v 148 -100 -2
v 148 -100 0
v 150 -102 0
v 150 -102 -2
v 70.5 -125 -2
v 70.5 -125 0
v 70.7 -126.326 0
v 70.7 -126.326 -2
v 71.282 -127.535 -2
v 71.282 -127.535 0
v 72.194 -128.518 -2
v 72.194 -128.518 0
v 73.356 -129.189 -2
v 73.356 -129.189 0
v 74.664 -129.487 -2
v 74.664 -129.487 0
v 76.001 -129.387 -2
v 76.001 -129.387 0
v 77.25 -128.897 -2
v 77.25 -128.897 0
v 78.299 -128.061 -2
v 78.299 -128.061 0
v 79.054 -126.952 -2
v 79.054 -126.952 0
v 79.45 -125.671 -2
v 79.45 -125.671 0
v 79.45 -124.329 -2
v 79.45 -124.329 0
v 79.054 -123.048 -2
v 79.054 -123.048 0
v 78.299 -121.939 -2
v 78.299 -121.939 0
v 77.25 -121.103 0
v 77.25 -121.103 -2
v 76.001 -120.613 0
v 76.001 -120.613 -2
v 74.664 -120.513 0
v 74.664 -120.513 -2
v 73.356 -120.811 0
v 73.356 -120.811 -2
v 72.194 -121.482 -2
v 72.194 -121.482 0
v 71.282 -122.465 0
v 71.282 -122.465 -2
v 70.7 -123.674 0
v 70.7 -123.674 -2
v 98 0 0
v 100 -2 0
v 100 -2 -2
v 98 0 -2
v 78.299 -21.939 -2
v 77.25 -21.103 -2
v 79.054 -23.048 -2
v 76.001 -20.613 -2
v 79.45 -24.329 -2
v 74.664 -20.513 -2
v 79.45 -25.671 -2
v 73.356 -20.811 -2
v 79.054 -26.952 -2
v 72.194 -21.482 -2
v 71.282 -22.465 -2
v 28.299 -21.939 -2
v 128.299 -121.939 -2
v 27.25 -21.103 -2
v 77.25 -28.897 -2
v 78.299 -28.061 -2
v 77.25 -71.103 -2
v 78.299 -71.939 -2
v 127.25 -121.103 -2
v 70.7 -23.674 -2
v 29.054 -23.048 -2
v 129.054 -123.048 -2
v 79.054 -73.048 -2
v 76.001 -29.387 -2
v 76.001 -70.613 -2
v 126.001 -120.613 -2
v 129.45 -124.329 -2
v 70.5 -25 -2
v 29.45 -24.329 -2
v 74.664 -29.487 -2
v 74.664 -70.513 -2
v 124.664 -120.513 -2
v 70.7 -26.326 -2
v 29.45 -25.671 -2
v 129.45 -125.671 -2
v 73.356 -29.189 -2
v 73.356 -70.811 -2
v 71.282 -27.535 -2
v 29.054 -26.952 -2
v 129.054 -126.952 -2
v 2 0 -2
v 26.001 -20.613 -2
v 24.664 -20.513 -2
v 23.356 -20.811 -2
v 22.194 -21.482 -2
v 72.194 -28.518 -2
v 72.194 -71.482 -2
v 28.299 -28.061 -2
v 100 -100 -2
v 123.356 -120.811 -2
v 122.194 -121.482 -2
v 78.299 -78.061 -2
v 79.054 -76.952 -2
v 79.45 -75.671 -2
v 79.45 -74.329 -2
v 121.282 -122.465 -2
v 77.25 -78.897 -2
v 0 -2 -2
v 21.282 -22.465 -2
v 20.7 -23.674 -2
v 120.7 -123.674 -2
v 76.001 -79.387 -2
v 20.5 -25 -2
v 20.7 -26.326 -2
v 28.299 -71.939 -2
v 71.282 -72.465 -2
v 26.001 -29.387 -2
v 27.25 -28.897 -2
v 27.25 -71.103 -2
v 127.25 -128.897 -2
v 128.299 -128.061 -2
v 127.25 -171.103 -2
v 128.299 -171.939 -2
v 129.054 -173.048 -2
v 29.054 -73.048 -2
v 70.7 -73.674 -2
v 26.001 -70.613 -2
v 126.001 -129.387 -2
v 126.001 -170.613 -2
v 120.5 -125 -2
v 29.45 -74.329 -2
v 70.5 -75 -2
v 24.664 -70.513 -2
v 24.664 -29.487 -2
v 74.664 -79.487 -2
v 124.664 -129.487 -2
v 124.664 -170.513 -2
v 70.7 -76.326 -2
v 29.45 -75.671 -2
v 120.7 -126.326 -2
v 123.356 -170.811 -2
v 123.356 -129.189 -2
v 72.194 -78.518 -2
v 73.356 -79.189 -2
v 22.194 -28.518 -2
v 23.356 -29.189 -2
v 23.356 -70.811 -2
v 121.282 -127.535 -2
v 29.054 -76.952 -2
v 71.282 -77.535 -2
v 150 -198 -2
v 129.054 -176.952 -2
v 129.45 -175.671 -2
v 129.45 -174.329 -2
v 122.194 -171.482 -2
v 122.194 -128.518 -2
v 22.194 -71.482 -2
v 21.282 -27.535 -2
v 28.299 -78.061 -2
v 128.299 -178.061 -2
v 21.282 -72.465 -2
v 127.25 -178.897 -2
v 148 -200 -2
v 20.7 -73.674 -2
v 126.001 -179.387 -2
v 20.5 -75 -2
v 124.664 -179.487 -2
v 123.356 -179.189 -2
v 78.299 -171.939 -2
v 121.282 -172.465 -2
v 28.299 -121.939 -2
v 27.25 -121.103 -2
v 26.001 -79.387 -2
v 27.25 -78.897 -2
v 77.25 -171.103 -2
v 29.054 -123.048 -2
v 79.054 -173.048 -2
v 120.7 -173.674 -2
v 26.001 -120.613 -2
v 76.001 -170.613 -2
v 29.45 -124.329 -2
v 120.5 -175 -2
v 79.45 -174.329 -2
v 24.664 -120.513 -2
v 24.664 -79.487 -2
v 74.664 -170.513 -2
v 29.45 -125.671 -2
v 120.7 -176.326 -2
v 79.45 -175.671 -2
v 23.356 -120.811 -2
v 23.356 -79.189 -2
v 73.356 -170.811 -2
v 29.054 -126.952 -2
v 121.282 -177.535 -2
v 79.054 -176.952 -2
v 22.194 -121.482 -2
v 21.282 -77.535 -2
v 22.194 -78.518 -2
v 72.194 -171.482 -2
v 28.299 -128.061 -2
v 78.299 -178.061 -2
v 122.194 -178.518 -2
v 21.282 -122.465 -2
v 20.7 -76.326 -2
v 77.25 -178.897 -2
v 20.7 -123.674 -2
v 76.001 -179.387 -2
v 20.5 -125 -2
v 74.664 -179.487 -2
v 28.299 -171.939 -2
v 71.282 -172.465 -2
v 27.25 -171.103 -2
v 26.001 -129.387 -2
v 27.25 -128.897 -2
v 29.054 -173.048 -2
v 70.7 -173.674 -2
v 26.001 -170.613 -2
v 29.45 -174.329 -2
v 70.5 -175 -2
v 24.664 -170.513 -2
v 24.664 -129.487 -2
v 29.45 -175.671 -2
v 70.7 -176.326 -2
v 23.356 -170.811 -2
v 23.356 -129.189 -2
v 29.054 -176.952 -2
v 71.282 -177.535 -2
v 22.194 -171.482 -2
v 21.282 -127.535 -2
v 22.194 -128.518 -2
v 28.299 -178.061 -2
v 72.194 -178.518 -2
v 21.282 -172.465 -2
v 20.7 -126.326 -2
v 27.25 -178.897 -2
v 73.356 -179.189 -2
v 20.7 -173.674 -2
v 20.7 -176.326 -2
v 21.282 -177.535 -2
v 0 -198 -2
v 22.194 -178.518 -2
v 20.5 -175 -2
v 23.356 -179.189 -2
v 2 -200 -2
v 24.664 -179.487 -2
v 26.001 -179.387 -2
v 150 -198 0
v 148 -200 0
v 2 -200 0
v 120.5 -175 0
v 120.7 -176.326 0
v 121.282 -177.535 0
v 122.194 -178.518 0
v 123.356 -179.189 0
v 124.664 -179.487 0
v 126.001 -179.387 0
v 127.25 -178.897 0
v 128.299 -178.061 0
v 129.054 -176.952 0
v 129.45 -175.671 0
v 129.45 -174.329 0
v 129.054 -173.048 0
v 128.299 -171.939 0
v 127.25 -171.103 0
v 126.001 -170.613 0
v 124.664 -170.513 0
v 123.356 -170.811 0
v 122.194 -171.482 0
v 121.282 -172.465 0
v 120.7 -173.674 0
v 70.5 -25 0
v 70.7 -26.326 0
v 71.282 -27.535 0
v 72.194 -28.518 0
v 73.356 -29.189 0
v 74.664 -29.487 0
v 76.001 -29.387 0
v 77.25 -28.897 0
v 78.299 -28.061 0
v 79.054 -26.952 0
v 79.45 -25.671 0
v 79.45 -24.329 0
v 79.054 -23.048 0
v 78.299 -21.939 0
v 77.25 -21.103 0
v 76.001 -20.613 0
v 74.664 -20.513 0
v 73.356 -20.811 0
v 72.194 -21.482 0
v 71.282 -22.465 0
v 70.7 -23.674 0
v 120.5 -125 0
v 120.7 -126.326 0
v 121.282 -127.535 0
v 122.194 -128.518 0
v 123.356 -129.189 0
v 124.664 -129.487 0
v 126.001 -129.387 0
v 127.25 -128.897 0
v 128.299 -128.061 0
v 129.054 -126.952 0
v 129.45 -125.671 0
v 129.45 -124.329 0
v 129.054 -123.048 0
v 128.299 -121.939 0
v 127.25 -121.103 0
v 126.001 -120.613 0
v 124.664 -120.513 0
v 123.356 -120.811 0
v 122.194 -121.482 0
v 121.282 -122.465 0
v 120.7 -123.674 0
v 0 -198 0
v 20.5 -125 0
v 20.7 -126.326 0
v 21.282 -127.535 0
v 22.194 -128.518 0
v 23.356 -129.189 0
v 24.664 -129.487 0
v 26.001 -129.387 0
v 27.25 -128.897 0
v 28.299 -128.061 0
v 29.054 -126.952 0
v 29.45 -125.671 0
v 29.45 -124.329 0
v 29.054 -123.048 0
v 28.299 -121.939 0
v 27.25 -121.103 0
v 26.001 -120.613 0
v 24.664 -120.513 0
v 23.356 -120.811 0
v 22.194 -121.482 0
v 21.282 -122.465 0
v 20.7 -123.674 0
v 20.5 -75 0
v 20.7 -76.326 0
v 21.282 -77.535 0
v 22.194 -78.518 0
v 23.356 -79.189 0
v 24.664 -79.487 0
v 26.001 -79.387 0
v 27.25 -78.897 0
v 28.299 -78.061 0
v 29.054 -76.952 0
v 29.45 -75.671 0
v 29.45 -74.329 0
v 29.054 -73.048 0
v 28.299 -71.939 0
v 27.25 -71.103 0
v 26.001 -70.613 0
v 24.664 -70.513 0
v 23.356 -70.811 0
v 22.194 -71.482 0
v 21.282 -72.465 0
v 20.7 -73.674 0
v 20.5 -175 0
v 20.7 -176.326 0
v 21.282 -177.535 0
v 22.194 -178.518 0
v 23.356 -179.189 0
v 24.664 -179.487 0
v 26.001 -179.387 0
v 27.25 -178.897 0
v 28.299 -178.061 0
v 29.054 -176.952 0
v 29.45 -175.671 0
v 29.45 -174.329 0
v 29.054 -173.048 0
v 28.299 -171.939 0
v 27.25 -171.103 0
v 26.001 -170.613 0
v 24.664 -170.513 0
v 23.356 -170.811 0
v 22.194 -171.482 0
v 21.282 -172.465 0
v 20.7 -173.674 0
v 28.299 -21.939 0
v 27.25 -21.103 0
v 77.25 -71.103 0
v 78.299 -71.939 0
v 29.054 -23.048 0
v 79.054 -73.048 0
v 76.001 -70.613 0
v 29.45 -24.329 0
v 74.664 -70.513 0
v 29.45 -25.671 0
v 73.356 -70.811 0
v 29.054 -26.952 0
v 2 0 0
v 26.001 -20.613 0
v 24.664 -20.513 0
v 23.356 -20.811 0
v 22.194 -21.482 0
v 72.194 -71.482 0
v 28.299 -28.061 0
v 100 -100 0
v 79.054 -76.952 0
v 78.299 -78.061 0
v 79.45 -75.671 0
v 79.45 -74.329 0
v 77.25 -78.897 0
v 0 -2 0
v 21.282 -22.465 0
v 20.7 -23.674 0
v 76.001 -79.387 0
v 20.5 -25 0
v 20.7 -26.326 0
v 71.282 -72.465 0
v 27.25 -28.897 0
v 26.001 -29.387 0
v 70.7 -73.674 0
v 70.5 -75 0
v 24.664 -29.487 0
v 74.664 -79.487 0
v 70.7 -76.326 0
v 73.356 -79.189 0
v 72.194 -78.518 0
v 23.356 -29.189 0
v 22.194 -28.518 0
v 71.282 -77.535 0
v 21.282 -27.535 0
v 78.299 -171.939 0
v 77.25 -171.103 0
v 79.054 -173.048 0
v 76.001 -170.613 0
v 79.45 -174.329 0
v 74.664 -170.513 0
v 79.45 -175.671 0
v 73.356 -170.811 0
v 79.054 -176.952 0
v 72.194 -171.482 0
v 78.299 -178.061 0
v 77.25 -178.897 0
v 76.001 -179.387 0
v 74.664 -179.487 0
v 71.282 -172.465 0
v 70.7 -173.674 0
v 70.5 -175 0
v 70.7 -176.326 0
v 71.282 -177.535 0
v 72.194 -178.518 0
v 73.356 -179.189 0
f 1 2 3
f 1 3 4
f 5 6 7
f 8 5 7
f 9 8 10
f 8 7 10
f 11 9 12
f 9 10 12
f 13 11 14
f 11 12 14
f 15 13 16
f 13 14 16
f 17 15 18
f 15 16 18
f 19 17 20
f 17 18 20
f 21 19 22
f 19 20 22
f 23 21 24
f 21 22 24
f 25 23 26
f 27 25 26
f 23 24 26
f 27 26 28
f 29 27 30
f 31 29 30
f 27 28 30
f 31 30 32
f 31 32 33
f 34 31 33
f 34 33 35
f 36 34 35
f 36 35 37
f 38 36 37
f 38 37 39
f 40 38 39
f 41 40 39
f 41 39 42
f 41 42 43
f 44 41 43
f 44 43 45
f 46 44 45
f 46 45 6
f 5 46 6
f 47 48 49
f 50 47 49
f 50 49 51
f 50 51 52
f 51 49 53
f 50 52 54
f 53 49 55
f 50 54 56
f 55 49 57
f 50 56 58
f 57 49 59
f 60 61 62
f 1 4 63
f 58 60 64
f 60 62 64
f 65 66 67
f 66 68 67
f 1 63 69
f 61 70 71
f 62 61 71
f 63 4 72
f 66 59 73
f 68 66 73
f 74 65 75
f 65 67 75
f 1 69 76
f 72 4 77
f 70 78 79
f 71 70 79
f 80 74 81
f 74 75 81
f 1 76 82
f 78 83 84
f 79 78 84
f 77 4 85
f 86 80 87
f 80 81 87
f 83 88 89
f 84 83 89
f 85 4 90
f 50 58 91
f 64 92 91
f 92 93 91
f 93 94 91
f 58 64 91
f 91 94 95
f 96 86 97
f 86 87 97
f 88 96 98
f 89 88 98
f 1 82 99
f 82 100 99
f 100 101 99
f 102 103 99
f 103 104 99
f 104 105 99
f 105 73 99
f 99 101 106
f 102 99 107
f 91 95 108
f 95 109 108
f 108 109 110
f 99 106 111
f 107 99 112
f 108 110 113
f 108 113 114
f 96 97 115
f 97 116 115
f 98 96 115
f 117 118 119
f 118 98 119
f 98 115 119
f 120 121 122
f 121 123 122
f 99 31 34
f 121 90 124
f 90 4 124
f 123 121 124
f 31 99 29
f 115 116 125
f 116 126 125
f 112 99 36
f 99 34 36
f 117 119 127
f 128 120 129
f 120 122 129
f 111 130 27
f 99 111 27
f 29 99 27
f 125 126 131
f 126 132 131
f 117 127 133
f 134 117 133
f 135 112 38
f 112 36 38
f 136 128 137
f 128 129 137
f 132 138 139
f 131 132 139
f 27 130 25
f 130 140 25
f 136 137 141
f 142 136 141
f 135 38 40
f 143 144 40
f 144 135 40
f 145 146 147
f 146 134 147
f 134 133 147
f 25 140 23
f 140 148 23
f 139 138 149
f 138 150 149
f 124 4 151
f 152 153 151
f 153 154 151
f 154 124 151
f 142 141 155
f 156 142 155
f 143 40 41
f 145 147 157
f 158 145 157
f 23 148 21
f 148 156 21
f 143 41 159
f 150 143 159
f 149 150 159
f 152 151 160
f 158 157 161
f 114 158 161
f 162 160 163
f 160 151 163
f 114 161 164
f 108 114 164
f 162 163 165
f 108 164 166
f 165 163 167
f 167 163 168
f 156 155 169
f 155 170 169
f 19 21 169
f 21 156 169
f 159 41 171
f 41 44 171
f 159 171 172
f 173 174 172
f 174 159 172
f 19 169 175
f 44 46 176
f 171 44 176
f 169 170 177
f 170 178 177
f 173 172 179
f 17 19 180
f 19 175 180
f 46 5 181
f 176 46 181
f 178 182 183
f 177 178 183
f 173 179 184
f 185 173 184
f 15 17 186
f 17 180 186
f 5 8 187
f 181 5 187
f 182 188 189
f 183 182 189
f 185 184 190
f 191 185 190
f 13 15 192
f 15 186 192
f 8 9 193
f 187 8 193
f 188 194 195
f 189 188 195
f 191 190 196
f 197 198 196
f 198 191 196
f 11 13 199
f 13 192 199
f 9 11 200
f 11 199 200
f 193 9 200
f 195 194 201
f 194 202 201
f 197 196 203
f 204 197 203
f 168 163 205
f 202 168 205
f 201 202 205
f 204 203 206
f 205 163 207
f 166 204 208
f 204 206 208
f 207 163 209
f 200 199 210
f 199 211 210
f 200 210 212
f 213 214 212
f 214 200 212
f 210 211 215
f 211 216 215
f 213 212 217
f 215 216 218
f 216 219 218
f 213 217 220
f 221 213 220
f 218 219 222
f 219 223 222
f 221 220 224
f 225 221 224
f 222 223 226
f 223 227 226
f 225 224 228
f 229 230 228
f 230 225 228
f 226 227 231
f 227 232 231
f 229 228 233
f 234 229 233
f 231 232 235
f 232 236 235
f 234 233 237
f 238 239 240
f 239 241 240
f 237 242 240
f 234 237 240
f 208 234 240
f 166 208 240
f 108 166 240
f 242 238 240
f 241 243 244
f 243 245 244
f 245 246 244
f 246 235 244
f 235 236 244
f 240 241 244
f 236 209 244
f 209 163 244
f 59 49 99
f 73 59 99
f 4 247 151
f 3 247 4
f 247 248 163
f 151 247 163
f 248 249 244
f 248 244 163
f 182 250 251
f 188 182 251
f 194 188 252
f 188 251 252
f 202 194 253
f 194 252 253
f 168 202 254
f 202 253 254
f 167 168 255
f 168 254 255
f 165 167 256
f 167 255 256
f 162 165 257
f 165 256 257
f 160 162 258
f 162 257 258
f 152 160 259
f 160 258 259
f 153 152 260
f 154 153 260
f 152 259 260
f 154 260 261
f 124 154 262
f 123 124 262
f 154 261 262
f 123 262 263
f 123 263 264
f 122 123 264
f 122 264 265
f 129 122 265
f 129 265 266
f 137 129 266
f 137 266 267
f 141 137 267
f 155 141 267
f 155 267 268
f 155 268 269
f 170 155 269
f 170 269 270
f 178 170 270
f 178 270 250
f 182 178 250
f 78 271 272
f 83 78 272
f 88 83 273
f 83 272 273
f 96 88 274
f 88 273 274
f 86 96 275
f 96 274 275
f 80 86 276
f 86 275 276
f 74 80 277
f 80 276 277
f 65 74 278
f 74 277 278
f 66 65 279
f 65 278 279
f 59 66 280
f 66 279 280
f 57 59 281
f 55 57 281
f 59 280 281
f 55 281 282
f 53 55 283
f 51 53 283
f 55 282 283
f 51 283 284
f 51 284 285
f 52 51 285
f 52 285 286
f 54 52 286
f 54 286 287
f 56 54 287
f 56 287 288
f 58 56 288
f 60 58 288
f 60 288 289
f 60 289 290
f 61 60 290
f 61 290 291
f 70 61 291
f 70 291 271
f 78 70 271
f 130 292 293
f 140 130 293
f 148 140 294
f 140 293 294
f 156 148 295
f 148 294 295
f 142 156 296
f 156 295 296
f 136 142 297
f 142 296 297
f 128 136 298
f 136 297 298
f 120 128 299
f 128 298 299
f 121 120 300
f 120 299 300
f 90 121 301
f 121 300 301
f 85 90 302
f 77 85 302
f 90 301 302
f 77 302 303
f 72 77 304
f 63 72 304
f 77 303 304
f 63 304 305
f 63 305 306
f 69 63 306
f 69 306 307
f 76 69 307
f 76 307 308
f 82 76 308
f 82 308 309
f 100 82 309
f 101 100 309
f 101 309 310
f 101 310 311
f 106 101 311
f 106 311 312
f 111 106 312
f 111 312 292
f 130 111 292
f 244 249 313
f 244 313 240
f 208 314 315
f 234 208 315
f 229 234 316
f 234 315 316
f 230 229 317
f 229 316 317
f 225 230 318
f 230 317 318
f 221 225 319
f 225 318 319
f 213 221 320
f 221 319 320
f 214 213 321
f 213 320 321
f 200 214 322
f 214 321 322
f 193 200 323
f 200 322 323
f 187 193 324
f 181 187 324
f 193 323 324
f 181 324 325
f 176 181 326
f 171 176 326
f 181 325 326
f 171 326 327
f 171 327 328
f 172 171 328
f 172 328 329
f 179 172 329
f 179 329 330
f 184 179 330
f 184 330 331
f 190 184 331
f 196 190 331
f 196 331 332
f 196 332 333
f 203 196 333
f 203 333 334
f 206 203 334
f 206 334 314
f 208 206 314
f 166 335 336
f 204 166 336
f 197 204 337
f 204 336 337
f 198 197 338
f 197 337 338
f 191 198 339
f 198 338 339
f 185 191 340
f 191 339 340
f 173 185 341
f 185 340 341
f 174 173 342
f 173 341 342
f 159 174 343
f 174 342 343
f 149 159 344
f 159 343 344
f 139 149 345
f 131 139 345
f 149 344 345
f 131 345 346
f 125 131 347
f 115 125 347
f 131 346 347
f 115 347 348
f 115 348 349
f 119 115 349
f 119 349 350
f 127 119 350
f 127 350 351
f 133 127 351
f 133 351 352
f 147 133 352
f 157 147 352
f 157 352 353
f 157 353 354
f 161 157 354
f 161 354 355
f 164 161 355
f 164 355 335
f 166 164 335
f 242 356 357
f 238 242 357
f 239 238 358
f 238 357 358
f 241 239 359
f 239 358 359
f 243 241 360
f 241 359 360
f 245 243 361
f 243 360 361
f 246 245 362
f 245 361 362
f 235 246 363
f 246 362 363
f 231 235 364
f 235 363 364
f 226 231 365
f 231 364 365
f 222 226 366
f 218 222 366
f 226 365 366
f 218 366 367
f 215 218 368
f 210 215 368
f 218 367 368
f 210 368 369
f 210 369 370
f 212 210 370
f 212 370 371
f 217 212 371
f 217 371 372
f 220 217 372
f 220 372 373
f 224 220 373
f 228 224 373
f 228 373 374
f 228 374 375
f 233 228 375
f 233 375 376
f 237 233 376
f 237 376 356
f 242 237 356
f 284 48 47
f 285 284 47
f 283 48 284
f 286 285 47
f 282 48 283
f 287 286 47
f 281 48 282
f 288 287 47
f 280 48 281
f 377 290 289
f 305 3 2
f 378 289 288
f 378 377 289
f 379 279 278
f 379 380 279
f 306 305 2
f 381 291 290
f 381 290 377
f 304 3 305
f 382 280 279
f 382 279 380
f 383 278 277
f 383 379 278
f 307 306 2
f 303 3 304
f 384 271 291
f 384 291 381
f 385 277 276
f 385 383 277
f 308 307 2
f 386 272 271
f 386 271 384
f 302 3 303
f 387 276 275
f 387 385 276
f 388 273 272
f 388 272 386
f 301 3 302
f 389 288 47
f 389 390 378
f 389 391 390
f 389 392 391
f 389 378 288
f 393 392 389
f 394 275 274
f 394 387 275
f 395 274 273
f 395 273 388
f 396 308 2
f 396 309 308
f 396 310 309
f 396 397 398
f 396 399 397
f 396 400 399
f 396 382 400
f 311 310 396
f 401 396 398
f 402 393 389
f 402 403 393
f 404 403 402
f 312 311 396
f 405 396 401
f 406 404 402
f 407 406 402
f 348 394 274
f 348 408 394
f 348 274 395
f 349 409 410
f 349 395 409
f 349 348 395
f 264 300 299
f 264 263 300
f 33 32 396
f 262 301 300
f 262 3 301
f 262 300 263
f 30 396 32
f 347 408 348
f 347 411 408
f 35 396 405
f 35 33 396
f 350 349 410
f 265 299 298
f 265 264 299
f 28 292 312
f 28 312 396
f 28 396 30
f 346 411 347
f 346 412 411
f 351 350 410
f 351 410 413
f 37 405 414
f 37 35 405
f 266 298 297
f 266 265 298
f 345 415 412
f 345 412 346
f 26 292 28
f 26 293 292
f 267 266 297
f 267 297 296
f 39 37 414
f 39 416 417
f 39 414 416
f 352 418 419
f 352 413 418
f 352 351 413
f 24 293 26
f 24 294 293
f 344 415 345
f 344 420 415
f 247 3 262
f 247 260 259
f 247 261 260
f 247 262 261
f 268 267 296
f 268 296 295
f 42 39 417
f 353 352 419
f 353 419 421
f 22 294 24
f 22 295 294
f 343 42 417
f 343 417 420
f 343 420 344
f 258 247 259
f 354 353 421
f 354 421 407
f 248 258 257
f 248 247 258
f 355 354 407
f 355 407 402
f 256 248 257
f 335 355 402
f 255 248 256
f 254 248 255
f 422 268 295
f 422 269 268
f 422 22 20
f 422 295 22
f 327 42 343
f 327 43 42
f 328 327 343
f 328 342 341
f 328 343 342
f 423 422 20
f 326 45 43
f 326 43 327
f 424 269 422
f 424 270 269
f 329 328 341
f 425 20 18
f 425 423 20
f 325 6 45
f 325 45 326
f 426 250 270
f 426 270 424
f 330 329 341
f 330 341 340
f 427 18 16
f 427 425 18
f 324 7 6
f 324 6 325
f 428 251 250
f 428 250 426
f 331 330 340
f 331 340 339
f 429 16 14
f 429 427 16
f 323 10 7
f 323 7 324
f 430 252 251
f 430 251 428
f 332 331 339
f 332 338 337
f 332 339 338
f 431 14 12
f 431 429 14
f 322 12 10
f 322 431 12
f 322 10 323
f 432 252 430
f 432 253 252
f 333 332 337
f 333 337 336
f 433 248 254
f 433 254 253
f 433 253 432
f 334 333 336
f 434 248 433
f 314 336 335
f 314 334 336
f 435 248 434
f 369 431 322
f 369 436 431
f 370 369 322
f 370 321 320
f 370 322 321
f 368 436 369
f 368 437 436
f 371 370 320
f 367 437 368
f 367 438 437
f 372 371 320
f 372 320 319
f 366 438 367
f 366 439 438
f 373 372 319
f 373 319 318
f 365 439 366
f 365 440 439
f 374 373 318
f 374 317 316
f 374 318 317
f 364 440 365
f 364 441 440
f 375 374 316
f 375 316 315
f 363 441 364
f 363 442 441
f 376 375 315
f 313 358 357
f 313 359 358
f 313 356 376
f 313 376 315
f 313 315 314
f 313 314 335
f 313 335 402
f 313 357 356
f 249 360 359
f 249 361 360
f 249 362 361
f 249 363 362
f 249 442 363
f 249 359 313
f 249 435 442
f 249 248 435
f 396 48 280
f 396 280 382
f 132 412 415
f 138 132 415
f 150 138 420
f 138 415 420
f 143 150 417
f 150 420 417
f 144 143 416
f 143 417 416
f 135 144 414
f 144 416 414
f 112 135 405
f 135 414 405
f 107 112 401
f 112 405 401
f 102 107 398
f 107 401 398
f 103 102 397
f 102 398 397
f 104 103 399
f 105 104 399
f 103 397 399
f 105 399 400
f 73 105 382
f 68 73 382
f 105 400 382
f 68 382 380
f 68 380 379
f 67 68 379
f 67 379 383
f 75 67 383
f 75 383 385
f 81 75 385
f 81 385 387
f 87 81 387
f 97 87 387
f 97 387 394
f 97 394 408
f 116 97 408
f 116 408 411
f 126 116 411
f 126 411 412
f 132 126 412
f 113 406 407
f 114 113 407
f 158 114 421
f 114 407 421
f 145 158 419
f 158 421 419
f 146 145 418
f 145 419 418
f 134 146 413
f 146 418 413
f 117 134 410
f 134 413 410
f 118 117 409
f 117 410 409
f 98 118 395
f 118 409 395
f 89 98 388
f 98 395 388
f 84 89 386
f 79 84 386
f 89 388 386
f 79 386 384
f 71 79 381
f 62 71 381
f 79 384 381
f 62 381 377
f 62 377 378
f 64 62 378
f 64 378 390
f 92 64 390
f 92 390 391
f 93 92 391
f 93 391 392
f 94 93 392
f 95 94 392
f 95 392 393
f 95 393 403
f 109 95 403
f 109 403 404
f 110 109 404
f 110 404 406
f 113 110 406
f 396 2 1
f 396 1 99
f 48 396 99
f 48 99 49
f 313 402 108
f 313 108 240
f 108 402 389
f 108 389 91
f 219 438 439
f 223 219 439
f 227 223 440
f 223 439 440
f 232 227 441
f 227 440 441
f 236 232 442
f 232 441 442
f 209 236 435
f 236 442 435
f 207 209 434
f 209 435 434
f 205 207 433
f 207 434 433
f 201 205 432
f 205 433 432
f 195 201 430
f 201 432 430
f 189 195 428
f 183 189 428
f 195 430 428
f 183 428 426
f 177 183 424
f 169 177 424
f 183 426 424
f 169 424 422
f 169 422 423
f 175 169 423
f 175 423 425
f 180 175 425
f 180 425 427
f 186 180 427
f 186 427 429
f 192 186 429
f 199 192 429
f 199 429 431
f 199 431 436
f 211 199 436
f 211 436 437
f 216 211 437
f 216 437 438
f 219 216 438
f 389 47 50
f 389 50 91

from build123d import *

# Parameters (mm, degrees)
EXTRUDE_1_DEPTH   = 2
HOLE_WIZARD_M81_D = 9
CHAMFER_1_SIZE    = 2


with BuildPart() as part:
    # Эскиз1 → Бобышка-Вытянуть1 (new body)
    with BuildSketch(Plane(origin=(0, 0, 0), x_dir=(1, 0, 0), z_dir=(0, 0, -1))):
        Polygon((0, 0), (0, 200), (150, 200), (150, 100), (100, 100), (100, 0), align=None)
    extrude(amount=EXTRUDE_1_DEPTH)

    # Отверстие с зазором M81 (through all)
    with Locations(Plane(origin=(0, 0, -2), x_dir=(1, 0, 0), z_dir=(0, 0, -1))):
        with Locations((25, 175), (25, 125), (25, 75), (25, 25), (75, 175), (75, 125), (75, 75), (75, 25), (125, 175), (125, 125)):
            Hole(HOLE_WIZARD_M81_D / 2)

    # Фаска1
    chamfer_1_edges = [part.edges().sort_by_distance(p)[0] for p in [
        (0, 0, -1),
        (0, -200, -1),
        (150, -200, -1),
        (150, -100, -1),
        (100, 0, -1),
    ]]
    chamfer(chamfer_1_edges, length=CHAMFER_1_SIZE)


solid = part.part
